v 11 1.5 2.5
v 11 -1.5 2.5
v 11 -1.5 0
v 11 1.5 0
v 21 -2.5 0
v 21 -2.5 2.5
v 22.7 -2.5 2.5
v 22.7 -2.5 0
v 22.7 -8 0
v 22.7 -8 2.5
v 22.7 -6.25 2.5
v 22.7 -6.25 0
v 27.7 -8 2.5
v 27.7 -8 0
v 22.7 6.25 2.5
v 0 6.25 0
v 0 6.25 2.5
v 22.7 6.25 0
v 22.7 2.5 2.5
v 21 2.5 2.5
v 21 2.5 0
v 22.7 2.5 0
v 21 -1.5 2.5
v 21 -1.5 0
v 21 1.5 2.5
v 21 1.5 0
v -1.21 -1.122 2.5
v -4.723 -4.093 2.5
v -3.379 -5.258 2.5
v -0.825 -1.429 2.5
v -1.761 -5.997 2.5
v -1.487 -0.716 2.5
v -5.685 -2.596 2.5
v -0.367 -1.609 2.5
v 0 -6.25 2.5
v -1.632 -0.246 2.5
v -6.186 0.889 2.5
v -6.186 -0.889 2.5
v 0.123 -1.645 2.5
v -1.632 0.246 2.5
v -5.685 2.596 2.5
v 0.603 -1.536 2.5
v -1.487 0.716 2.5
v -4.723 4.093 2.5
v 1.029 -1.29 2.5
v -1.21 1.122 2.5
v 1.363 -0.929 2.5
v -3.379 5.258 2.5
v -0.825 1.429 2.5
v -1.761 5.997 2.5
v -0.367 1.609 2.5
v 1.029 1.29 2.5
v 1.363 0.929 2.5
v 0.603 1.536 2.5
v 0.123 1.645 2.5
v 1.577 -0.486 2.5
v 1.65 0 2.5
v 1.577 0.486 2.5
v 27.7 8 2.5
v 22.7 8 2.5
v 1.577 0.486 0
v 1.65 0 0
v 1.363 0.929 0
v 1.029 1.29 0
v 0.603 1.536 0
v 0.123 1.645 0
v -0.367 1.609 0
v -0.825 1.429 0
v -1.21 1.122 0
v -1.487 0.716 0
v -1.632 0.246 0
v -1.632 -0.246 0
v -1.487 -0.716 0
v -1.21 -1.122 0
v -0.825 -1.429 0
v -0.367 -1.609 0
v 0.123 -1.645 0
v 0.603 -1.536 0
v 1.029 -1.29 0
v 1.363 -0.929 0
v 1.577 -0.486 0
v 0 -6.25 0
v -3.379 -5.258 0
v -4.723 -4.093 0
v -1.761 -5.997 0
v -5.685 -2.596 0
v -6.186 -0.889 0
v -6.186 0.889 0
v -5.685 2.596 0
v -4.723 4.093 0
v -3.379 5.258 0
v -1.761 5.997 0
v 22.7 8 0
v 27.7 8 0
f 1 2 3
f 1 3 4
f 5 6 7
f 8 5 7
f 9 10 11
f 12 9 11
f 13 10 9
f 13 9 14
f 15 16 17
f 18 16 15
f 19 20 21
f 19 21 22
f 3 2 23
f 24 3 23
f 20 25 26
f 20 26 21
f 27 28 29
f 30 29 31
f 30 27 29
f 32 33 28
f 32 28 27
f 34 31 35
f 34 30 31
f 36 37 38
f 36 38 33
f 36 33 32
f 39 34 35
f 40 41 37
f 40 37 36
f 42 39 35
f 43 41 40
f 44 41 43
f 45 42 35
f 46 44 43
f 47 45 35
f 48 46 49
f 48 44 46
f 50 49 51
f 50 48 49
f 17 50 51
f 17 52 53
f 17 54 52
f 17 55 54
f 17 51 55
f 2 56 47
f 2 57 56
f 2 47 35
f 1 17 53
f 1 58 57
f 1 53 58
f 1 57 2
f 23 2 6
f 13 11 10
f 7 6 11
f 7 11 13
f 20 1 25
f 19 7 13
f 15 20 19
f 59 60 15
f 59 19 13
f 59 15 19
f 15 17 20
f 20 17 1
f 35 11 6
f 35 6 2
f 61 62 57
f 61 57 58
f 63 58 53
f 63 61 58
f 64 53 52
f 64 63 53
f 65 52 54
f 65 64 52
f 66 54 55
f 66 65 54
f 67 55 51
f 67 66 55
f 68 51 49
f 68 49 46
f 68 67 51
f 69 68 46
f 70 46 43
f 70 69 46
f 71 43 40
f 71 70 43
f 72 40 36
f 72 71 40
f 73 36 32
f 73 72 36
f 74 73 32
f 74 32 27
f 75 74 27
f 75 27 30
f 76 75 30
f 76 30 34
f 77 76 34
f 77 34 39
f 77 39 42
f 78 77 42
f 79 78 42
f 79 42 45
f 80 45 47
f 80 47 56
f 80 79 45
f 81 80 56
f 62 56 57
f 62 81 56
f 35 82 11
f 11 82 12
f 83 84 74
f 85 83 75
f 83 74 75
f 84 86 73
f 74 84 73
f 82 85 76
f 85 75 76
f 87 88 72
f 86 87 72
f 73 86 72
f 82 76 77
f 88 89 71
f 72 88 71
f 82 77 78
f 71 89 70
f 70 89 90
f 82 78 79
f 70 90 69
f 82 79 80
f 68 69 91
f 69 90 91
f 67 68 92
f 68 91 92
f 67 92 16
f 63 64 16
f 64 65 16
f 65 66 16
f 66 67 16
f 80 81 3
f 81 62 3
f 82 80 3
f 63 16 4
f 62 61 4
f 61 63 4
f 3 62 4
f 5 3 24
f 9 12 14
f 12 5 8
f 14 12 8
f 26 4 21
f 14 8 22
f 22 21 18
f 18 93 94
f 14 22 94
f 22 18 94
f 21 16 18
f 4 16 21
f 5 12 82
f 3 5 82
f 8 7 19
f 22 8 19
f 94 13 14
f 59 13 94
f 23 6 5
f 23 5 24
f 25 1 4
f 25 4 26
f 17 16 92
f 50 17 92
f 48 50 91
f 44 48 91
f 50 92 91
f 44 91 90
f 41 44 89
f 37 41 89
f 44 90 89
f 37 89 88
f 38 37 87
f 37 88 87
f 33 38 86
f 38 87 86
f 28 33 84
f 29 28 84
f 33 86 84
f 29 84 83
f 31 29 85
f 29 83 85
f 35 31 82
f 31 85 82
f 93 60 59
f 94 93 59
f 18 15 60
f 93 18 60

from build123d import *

# Parameters (mm, degrees)
SKETCH1_R           = 1.65
SKETCH1_W           = 10
SKETCH1_H           = 12.5
BOSS_EXTRUDE1_DEPTH = 2.5
SKETCH2_W           = 5
SKETCH2_H           = 16
BOSS_EXTRUDE2_DEPTH = 2.5
SKETCH3_W           = 1.7
SKETCH3_H           = 5
CUT_EXTRUDE1_DEPTH  = 29.940283343
SKETCH5_W           = 10
SKETCH5_H           = 3
CUT_EXTRUDE2_DEPTH  = 29.940283343


with BuildPart() as part:
    # Sketch1 → Boss-Extrude1 (new body)
    # profile 1 of 2: a face of its own
    with BuildSketch(Plane.XY):
        with BuildLine():
            ThreePointArc((0, 6.25), (-6.25, 0), (0, -6.25))
            Line((0, -6.25), (12.7, -6.25))
            Line((12.7, -6.25), (12.7, 6.25))
            Line((12.7, 6.25), (0, 6.25))
        make_face()
        Circle(SKETCH1_R, mode=Mode.SUBTRACT)
    # profile 2 of 2: a face of its own
    with BuildSketch(Plane.XY):
        with Locations((17.7, 0)):
            Rectangle(SKETCH1_W, SKETCH1_H)
    extrude(amount=BOSS_EXTRUDE1_DEPTH)

    # Sketch2 → Boss-Extrude2 (add)
    with BuildSketch(Plane.XY.offset(2.5)):
        with Locations((25.2, 0)):
            Rectangle(SKETCH2_W, SKETCH2_H)
    extrude(amount=-BOSS_EXTRUDE2_DEPTH)

    # Sketch3 → Cut-Extrude1 (cut, through all)
    with BuildSketch(Plane.XY.offset(2.5)):
        with Locations((21.85, 0)):
            Rectangle(SKETCH3_W, SKETCH3_H)
    extrude(amount=-CUT_EXTRUDE1_DEPTH, mode=Mode.SUBTRACT)

    # Sketch5 → Cut-Extrude2 (cut, through all)
    with BuildSketch(Plane.XY.offset(2.5)):
        with Locations((16, 0)):
            Rectangle(SKETCH5_W, SKETCH5_H)
    extrude(amount=-CUT_EXTRUDE2_DEPTH, mode=Mode.SUBTRACT)


solid = part.part
